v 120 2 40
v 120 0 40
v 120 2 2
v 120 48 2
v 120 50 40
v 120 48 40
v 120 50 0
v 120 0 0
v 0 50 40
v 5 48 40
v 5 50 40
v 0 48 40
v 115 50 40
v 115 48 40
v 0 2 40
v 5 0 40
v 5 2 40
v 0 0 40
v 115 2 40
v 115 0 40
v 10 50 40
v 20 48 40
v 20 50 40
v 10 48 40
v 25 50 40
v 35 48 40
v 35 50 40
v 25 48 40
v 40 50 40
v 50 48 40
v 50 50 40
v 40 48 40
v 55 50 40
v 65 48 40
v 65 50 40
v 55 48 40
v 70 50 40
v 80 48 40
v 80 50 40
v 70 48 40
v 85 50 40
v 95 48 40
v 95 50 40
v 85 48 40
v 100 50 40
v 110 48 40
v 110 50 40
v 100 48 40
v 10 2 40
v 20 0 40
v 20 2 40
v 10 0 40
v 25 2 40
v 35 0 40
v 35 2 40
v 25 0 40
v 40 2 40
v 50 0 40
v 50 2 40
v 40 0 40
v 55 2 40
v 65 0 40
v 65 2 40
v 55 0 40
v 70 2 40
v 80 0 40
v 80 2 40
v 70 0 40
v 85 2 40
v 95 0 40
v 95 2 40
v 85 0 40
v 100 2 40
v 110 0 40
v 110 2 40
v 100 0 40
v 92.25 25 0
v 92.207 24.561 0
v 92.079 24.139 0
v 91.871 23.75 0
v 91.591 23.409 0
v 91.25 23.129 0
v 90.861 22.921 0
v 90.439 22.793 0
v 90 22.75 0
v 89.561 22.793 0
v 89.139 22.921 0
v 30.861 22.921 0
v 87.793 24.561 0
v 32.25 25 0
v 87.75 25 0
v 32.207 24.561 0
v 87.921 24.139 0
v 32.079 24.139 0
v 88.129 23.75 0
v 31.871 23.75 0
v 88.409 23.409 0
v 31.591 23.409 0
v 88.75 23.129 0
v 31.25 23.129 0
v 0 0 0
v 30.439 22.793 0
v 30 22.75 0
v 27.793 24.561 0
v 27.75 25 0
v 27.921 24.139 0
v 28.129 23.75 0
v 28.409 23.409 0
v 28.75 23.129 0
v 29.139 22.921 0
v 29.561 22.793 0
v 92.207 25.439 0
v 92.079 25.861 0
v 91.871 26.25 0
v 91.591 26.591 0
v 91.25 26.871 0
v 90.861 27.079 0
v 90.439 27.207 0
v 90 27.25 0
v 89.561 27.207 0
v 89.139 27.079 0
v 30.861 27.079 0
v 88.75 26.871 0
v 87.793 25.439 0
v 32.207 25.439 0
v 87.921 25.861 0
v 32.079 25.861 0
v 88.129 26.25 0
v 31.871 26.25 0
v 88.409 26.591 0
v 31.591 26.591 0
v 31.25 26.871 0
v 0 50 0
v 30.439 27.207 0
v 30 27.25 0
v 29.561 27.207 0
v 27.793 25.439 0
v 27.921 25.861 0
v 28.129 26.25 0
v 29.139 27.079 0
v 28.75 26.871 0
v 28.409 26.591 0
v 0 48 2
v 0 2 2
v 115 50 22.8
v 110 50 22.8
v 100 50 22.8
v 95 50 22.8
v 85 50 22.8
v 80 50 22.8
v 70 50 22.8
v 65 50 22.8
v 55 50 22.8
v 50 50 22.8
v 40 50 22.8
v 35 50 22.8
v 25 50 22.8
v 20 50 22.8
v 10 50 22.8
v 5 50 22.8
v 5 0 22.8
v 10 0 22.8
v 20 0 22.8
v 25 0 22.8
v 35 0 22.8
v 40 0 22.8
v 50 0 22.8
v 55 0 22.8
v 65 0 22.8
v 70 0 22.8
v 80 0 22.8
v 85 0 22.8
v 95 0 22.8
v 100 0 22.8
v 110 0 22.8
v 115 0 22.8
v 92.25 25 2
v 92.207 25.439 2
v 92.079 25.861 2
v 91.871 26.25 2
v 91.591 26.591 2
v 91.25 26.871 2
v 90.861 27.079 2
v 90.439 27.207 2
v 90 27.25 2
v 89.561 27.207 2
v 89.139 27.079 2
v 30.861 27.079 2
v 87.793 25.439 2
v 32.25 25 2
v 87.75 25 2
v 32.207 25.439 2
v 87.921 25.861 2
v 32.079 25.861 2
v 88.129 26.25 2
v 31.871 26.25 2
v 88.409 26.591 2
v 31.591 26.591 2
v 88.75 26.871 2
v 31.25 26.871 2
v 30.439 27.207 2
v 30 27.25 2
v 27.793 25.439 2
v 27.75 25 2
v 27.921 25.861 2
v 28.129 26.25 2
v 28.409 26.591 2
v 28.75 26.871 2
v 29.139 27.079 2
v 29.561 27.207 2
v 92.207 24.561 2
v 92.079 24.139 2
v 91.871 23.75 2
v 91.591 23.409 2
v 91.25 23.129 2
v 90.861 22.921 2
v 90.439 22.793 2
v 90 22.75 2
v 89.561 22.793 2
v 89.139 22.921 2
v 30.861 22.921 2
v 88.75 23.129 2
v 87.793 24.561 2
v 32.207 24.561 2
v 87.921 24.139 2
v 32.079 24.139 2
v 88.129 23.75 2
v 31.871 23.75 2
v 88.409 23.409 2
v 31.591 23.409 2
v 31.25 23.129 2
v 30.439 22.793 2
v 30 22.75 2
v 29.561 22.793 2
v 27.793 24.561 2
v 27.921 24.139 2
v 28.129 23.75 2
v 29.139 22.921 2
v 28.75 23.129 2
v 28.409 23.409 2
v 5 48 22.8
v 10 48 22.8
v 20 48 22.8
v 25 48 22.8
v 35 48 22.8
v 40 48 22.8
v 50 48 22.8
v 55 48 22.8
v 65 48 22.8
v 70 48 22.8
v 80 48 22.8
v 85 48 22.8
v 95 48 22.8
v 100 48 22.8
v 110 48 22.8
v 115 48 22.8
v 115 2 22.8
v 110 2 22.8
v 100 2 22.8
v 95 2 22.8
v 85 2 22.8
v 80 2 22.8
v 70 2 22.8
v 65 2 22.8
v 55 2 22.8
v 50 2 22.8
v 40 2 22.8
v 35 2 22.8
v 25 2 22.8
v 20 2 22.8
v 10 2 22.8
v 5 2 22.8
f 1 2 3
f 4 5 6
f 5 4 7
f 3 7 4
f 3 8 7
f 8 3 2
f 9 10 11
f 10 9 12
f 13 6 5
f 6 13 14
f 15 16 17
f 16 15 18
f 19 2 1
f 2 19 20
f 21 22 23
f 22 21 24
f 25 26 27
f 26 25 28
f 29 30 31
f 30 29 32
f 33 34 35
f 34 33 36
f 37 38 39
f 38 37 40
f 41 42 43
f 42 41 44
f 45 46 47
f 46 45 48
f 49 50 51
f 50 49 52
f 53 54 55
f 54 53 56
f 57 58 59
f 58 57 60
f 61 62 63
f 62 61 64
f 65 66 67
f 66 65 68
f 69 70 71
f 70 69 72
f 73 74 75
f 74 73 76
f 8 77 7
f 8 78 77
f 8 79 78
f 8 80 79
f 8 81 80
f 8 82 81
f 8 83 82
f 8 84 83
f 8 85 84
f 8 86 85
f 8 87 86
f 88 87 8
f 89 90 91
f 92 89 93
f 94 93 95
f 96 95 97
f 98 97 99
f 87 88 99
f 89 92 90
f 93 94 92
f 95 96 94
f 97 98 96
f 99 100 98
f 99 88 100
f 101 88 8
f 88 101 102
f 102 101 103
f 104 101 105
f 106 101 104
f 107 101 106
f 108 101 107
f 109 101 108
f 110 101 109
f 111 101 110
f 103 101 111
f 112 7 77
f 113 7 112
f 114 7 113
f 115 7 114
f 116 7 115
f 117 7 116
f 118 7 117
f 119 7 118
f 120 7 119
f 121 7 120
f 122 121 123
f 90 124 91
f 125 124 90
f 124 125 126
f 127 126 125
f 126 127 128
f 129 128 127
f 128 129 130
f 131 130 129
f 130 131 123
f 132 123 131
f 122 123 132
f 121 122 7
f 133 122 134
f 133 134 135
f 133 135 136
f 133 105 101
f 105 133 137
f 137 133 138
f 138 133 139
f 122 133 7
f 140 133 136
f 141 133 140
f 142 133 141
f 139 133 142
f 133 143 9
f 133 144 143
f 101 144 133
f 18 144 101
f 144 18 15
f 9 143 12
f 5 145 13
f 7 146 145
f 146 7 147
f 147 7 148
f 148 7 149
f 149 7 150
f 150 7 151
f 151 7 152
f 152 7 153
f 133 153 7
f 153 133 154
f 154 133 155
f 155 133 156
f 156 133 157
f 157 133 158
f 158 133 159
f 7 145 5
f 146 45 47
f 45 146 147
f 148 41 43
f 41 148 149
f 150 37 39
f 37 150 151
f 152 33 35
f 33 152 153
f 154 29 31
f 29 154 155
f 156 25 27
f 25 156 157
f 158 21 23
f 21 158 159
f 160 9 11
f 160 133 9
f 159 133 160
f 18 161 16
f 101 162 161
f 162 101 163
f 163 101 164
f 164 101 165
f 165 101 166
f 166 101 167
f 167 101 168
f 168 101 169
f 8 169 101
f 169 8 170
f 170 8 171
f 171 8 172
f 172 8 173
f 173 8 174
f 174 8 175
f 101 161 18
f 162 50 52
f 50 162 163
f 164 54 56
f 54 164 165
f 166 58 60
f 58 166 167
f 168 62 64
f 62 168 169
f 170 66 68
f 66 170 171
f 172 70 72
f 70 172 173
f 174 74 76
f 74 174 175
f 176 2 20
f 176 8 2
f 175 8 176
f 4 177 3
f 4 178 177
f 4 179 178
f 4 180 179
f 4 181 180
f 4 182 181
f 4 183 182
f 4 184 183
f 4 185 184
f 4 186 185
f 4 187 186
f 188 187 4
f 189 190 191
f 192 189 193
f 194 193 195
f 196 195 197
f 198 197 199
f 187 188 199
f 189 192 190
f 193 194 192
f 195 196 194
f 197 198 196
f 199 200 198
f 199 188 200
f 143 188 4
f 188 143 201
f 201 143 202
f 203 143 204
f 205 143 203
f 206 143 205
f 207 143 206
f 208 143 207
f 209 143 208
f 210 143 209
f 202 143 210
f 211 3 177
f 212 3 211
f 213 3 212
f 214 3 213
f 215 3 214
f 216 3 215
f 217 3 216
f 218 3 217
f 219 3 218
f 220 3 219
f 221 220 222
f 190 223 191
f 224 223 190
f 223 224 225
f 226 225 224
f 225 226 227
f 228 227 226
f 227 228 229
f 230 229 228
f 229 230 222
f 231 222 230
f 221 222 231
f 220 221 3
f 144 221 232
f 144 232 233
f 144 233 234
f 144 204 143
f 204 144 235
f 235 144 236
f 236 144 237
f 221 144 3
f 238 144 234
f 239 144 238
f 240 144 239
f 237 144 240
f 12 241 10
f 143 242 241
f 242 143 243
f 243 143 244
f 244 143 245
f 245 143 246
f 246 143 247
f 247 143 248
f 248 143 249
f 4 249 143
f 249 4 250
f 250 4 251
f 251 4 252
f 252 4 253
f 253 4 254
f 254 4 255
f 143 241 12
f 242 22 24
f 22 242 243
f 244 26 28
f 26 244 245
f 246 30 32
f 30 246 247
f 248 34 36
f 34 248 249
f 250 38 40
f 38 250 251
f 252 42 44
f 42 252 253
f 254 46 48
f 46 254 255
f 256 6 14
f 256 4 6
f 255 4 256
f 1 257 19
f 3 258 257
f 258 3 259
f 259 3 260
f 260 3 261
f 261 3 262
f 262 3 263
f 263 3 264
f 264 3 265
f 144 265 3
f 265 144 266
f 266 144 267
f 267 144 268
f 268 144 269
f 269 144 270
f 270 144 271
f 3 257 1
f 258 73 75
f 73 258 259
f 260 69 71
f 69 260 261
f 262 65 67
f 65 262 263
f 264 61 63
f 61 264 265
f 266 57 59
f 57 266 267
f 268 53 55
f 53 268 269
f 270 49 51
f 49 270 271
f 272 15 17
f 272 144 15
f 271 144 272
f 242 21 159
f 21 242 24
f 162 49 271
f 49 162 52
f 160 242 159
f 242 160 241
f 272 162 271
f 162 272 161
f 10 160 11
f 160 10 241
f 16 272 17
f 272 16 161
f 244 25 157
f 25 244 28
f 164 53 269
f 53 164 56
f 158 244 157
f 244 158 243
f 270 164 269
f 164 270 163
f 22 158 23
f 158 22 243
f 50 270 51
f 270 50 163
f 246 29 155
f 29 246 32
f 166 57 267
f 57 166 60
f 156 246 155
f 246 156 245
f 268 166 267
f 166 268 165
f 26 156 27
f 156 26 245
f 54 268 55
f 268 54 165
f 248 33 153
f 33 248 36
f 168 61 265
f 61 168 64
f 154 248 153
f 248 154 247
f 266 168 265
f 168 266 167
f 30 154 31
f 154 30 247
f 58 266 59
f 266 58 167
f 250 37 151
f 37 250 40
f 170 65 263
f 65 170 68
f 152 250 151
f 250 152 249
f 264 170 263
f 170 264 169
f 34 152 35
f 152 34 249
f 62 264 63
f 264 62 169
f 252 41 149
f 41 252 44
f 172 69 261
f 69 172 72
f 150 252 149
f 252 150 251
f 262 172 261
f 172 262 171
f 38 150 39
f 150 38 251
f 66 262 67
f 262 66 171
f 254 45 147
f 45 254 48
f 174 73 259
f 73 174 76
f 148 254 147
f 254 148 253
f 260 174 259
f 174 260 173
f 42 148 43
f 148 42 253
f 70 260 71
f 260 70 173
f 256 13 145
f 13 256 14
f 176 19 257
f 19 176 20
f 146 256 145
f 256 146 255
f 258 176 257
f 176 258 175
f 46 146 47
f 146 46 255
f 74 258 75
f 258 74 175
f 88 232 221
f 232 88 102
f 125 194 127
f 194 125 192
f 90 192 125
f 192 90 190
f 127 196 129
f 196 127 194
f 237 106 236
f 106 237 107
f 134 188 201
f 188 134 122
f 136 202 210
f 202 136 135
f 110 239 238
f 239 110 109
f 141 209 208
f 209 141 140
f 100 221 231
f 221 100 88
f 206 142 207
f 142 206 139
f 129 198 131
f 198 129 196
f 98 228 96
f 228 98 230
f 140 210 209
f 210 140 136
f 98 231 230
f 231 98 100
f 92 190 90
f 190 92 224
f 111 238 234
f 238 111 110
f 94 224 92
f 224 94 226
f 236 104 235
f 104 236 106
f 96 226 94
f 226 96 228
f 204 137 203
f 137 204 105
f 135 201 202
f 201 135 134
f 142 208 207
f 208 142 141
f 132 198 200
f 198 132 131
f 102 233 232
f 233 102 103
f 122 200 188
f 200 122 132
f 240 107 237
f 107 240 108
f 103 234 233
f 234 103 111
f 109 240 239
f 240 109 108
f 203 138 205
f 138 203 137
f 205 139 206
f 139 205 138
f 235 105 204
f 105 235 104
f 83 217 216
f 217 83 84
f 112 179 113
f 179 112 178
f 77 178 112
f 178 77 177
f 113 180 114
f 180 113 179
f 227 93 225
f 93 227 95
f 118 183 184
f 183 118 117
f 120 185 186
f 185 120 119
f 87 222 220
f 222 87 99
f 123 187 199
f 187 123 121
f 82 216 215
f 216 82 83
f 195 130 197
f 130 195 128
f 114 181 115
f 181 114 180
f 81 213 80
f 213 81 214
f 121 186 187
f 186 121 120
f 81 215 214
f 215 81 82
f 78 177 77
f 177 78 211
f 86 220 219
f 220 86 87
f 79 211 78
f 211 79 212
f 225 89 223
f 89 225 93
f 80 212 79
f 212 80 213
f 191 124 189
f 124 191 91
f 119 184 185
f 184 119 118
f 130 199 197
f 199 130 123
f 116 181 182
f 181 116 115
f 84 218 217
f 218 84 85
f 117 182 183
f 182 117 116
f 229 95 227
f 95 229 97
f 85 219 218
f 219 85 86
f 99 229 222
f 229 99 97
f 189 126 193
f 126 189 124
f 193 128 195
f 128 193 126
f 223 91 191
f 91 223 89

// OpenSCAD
$fn = 32;

// ----------------------------------------------------------------------
// Cable duct: 120 x 50 x 40 mm, 8 fingers
// ----------------------------------------------------------------------

// --- parameters (mm) ---
tray_len = 120;           // duct length, X
tray_w = 50;              // duct width, Y
tray_h = 40;              // duct height, Z
tray_t = 2;               // side wall thickness
floor_t = 2;              // floor thickness
slot_w = 5;               // finger slot width
slot_h = 20.8;            // finger slot height
fingers = 8;              // number of finger slots per side
pitch = 15;               // finger pitch
hole_d = 4.5;             // floor mounting hole
hole_n = 2;               // mounting holes in the floor

module shell() {
  difference() {
    cube([tray_len, tray_w, tray_h]);
    /* open top channel */
    translate([-tray_t - 1, tray_t, floor_t])
      cube([tray_len + 2 * tray_t + 2, tray_w - 2 * tray_t, tray_h + 1]);
  }
}

difference() {
  union() {
    shell();
  }
  /* finger slots cut through both side walls */
  for (i = [0 : fingers - 1]) translate([pitch / 2 + i * pitch - slot_w / 2, -1, floor_t + slot_h]) cube([slot_w, tray_w + 2, tray_h]);
  for (i = [0 : hole_n - 1]) translate([(tray_len / hole_n) * (i + 0.5), tray_w / 2, -1]) cylinder(h = floor_t + 2, d = hole_d);
}
